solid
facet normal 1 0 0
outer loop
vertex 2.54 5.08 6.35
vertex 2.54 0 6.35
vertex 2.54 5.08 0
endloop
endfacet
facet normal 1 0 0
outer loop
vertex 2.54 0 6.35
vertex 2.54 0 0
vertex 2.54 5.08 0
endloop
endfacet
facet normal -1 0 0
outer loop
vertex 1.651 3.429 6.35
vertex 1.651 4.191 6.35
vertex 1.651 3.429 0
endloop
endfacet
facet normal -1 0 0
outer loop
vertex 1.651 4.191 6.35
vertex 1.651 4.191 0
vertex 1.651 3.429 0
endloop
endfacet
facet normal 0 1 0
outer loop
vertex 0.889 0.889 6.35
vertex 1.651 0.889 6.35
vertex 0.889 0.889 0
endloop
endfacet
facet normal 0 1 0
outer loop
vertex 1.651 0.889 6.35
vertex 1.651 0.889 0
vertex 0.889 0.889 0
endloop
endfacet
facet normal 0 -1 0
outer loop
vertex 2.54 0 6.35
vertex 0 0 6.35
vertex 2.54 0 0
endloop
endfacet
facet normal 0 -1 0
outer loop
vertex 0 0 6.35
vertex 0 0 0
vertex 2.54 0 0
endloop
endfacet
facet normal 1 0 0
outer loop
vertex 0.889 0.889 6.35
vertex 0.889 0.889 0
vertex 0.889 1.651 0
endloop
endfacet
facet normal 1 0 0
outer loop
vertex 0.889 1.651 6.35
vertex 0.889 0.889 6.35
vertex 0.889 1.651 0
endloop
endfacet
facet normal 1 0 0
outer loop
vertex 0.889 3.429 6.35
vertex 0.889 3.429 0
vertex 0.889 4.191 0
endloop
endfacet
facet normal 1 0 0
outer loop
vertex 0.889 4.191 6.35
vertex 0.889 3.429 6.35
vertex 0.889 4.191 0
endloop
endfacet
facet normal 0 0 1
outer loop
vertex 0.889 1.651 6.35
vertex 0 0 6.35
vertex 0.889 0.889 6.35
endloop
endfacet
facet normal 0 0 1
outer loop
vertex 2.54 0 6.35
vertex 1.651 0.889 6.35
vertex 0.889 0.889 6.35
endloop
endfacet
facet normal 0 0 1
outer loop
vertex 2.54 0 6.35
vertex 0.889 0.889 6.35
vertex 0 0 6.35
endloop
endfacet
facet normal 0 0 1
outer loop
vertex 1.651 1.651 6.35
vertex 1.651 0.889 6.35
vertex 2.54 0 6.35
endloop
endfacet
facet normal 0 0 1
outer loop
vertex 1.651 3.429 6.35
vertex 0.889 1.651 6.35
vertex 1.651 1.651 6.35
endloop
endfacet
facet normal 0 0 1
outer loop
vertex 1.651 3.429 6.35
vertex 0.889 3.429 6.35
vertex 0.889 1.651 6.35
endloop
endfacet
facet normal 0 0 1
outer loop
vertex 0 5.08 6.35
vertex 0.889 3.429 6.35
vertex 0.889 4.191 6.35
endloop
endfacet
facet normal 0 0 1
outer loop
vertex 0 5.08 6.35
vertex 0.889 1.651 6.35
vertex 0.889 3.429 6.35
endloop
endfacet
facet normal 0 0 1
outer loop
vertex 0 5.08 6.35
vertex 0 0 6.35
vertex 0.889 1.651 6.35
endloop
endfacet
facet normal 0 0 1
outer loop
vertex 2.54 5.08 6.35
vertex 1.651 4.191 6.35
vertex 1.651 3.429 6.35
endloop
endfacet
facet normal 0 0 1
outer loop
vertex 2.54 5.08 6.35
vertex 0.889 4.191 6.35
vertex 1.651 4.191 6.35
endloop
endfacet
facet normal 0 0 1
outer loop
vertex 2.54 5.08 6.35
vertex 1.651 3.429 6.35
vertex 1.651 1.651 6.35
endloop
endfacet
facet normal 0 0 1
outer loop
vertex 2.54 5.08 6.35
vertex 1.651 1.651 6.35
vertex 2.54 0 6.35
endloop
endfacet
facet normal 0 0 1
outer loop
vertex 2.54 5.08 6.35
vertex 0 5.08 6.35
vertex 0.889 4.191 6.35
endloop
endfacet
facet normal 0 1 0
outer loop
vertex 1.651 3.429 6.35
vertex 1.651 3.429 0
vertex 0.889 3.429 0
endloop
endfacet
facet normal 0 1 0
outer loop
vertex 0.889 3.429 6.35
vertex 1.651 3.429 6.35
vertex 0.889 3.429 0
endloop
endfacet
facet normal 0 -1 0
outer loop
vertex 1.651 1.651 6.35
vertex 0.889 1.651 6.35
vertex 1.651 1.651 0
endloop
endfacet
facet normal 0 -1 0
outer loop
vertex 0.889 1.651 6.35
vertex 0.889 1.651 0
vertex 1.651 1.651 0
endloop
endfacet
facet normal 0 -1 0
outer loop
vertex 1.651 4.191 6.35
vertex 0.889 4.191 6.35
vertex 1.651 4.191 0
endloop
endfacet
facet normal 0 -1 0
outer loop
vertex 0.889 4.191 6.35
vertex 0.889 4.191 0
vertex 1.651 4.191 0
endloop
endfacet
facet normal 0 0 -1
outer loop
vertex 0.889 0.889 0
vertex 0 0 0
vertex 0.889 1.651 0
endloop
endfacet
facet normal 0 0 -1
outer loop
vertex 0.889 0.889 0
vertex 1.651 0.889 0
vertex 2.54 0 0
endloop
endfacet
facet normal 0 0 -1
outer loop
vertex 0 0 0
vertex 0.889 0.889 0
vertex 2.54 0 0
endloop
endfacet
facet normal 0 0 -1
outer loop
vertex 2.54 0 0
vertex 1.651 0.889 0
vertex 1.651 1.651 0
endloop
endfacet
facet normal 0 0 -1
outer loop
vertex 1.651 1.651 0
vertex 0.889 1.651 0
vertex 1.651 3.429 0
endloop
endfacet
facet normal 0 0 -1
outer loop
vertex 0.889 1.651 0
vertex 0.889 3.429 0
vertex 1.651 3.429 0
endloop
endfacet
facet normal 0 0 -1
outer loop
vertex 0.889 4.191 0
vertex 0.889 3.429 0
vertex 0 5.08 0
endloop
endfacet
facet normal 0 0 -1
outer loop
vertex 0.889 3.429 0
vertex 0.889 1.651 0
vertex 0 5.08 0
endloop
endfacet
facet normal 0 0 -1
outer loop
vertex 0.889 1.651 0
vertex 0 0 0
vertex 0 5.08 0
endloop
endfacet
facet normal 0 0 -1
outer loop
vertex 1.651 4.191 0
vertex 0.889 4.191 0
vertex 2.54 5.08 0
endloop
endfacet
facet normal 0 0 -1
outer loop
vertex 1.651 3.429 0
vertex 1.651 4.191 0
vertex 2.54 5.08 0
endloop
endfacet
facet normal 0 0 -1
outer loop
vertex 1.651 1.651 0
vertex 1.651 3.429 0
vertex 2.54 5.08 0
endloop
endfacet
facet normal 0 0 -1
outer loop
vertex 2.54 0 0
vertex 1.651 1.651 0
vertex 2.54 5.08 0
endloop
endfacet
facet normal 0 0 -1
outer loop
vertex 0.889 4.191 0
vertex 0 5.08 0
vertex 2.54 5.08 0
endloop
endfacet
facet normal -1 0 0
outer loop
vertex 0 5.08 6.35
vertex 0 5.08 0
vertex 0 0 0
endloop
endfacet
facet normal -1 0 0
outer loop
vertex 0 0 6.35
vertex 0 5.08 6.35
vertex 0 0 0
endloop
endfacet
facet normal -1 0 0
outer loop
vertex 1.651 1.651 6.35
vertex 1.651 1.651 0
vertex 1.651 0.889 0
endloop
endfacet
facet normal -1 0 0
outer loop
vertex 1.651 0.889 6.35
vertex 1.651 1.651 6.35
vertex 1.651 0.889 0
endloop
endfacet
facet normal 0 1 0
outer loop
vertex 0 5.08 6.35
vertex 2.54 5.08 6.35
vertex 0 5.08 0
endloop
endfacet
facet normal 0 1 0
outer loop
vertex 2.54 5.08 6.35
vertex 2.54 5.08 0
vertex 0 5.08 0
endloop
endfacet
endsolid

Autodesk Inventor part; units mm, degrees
ref_plane "YZ Plane" through (0, 0, 0) normal (1, 0, 0) x (0, 1, 0)
ref_plane "XZ Plane" through (0, 0, 0) normal (0, 1, 0) x (-1, 0, 0)
ref_plane "XY Plane" through (0, 0, 0) normal (0, 0, 1) x (1, 0, 0)
sketch "Sketch1" plane through (0, 0, 0) normal (0, 0, 1) x (1, 0, 0)
  line L0 (0.889, 1.651) -> (1.651, 1.651)
  line L1 (1.651, 1.651) -> (1.651, 0.889)
  line L2 (1.651, 0.889) -> (0.889, 0.889)
  line L3 (0.889, 0.889) -> (0.889, 1.651)
  line L4 (0.889, 4.191) -> (1.651, 4.191)
  line L5 (1.651, 4.191) -> (1.651, 3.429)
  line L6 (1.651, 3.429) -> (0.889, 3.429)
  line L7 (0.889, 3.429) -> (0.889, 4.191)
  line L8 (0, 5.08) -> (0, 0)
  line L9 (0, 0) -> (2.54, 0)
  line L10 (2.54, 0) -> (2.54, 5.08)
  line L11 (2.54, 5.08) -> (0, 5.08)
  point P0 (5.08, 24.13)
extrude "Extrusion1" add sketch "Sketch1" along normal blind 6.35
ref_plane "Work Plane6" through (0, 0, 9.525) normal (0, 0, 1) x (1, 0, 0)
ref_plane "Work Plane7" through (0, 0, 12.7) normal (0, 0, 1) x (1, 0, 0)
ref_plane "Work Plane8" through (0, 0, 9.525) normal (0, 0, 1) x (1, 0, 0)
ref_plane "Work Plane9" through (0, 0, 12.7) normal (0, 0, 1) x (1, 0, 0)
ref_plane "Work Plane10" through (0, 0, 9.525) normal (0, 0, 1) x (1, 0, 0)
ref_plane "Work Plane11" through (0, 0, 12.7) normal (0, 0, 1) x (1, 0, 0)
properties part number "pwm connector 3 pin"
